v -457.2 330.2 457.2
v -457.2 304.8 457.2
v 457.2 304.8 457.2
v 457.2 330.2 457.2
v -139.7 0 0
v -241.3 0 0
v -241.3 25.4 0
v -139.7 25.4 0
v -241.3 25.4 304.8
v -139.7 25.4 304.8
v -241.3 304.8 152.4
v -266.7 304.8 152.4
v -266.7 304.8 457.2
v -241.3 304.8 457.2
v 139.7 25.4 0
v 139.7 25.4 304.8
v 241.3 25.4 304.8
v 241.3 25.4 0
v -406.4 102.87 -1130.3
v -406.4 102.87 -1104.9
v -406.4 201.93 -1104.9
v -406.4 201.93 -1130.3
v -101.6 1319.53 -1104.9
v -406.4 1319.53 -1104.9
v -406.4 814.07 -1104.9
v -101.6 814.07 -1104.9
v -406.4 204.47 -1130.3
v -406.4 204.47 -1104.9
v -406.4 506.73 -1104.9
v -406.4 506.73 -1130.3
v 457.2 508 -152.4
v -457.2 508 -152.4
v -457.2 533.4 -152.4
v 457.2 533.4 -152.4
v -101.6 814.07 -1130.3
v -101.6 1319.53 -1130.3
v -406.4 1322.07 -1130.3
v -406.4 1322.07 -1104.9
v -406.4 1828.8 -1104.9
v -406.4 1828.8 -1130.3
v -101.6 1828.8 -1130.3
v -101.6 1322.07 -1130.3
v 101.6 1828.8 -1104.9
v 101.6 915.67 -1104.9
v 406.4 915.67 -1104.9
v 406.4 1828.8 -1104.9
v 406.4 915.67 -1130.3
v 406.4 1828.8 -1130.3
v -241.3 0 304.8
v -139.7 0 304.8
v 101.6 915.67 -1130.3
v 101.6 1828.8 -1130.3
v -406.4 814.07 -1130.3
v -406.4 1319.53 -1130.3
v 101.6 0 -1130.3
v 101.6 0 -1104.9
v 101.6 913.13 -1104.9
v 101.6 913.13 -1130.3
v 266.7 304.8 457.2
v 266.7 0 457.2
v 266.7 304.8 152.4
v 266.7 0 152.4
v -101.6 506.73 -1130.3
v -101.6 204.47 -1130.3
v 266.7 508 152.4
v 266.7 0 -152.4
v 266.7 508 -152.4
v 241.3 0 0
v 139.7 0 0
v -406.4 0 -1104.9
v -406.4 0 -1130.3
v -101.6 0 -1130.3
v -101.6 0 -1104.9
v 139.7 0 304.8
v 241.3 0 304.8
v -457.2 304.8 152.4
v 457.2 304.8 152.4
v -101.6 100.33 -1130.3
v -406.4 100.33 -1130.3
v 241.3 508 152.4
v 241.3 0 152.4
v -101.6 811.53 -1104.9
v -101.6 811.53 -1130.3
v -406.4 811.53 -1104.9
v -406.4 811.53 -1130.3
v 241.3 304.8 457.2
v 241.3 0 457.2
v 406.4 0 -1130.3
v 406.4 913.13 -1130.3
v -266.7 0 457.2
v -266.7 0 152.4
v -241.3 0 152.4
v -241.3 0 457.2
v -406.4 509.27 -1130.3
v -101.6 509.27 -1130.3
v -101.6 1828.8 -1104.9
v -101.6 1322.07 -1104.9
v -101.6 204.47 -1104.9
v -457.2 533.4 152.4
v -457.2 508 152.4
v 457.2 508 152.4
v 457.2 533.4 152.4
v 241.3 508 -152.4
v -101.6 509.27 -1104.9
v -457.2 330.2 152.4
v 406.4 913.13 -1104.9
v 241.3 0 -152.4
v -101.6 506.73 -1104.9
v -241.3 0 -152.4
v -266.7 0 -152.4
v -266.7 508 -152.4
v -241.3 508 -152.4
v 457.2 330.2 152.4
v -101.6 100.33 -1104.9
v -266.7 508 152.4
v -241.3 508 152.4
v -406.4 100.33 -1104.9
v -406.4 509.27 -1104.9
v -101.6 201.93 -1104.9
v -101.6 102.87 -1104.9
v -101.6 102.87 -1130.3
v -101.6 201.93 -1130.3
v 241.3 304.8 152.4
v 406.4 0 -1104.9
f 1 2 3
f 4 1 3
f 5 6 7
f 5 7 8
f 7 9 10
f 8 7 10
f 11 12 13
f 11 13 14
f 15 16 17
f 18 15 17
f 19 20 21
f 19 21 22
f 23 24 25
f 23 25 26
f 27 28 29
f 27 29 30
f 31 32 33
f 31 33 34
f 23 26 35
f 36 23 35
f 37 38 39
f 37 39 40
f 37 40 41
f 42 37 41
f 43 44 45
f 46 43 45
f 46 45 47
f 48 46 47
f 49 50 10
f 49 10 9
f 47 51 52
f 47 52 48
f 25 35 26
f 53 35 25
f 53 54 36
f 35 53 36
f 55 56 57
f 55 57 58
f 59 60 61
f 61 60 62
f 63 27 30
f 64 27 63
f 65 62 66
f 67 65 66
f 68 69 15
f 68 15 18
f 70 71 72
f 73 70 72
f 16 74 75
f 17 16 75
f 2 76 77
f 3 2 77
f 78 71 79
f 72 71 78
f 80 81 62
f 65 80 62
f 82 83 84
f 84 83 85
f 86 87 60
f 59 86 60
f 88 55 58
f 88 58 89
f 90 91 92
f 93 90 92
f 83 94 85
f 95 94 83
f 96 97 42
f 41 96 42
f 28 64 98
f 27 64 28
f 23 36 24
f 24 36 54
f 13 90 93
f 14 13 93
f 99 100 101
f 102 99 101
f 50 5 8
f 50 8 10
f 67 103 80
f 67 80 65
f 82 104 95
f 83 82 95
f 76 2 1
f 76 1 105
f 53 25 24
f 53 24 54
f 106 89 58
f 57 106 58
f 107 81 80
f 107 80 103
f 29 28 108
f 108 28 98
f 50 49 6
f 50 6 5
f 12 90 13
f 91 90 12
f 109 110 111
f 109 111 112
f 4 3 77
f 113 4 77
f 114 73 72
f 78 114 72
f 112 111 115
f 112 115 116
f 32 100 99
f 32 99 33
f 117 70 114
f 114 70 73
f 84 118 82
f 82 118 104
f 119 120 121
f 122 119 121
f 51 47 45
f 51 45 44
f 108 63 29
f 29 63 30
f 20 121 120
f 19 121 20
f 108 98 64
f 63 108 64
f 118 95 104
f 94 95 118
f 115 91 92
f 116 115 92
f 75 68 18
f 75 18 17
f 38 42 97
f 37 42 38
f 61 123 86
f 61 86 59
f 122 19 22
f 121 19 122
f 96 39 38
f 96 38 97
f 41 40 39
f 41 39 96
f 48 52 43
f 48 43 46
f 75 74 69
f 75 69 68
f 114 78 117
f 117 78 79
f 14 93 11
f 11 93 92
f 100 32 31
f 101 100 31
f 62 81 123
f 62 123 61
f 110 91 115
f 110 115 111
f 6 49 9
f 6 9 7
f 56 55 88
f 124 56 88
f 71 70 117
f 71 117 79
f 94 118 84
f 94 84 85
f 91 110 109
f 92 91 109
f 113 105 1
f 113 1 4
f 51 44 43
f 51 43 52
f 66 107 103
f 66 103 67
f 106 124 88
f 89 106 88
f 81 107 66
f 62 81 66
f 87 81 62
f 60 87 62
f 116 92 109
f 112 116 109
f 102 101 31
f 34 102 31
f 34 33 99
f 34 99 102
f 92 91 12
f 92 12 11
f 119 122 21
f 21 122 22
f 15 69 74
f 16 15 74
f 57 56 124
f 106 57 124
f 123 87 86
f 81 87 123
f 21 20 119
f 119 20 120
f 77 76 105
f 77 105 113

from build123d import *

# Parameters (mm, degrees)
SKETCH1_W               = 25.4
SKETCH1_H               = 304.8
BOSS_EXTRUDE1_DEPTH     = 508
BOSS_EXTRUDE1_2_DEPTH   = 508
SKETCH2_W               = 914.4
SKETCH2_H               = 304.8
BOSS_EXTRUDE2_DEPTH     = 25.4
SKETCH3_W               = 25.4
SKETCH3_H               = 304.8
BOSS_EXTRUDE3_DEPTH     = 304.8
BOSS_EXTRUDE3_2_DEPTH   = 304.8
SKETCH4_W               = 914.4
SKETCH4_H               = 304.8
BOSS_EXTRUDE4_DEPTH     = 25.4
SKETCH5_W               = 304.8
SKETCH5_H               = 25.4
BOSS_EXTRUDE5_DEPTH     = 1828.8
BOSS_EXTRUDE5_2_DEPTH   = 1828.8
BOSS_EXTRUDE6_DEPTH     = 25.4
SKETCH7_W               = 101.6
SKETCH7_H               = 304.8
BOSS_EXTRUDE6_2_DEPTH   = 25.4
SKETCH6_W               = 304.8
SKETCH6_H               = 2.54
CUT_EXTRUDE_THIN1_DEPTH = 25.4


with BuildPart() as part:
    # Sketch1 → Boss-Extrude1 (new body)
    with BuildSketch(Plane(origin=(0, 0, 0), x_dir=(1, 0, 0), z_dir=(0, 1, 0))):
        with Locations((-254, 0)):
            Rectangle(SKETCH1_W, SKETCH1_H)
    extrude(amount=BOSS_EXTRUDE1_DEPTH)


with BuildPart() as body_2:
    # Sketch1 → Boss-Extrude1 2 (new body)
    with BuildSketch(Plane(origin=(0, 0, 0), x_dir=(1, 0, 0), z_dir=(0, 1, 0))):
        with Locations((254, 0)):
            Rectangle(SKETCH1_W, SKETCH1_H)
    extrude(amount=BOSS_EXTRUDE1_2_DEPTH)


with BuildPart() as body_3:
    # Sketch2 → Boss-Extrude2 (new body)
    with BuildSketch(Plane(origin=(0, 508, 0), x_dir=(1, 0, 0), z_dir=(0, 1, 0))):
        Rectangle(SKETCH2_W, SKETCH2_H)
    extrude(amount=BOSS_EXTRUDE2_DEPTH)


with BuildPart() as body_4:
    # Sketch3 → Boss-Extrude3 (new body)
    with BuildSketch(Plane(origin=(0, 0, 0), x_dir=(1, 0, 0), z_dir=(0, 1, 0))):
        with Locations((-254, -304.8)):
            Rectangle(SKETCH3_W, SKETCH3_H)
    extrude(amount=BOSS_EXTRUDE3_DEPTH)


with BuildPart() as body_5:
    # Sketch3 → Boss-Extrude3 2 (new body)
    with BuildSketch(Plane(origin=(0, 0, 0), x_dir=(1, 0, 0), z_dir=(0, 1, 0))):
        with Locations((254, -304.8)):
            Rectangle(SKETCH3_W, SKETCH3_H)
    extrude(amount=BOSS_EXTRUDE3_2_DEPTH)


with BuildPart() as body_6:
    # Sketch4 → Boss-Extrude4 (new body)
    with BuildSketch(Plane(origin=(0, 304.8, 0), x_dir=(1, 0, 0), z_dir=(0, 1, 0))):
        with Locations((0, -304.8)):
            Rectangle(SKETCH4_W, SKETCH4_H)
    extrude(amount=BOSS_EXTRUDE4_DEPTH)


with BuildPart() as body_7:
    # Sketch5 → Boss-Extrude5 (new body)
    with BuildSketch(Plane(origin=(0, 0, 0), x_dir=(1, 0, 0), z_dir=(0, 1, 0))):
        with Locations((-254, 1117.6)):
            Rectangle(SKETCH5_W, SKETCH5_H)
    extrude(amount=BOSS_EXTRUDE5_DEPTH)


with BuildPart() as body_8:
    # Sketch5 → Boss-Extrude5 2 (new body)
    with BuildSketch(Plane(origin=(0, 0, 0), x_dir=(1, 0, 0), z_dir=(0, 1, 0))):
        with Locations((254, 1117.6)):
            Rectangle(SKETCH5_W, SKETCH5_H)
    extrude(amount=BOSS_EXTRUDE5_2_DEPTH)


with BuildPart() as body_9:
    # Sketch7 → Boss-Extrude6 (new body)
    with BuildSketch(Plane.XZ):
        Polygon((-139.7, 304.8), (-241.3, 304.8), (-241.3, 152.4), (-241.3, 0), (-139.7, 0), align=None)
    extrude(amount=-BOSS_EXTRUDE6_DEPTH)


with BuildPart() as body_10:
    # Sketch7 → Boss-Extrude6 2 (new body)
    with BuildSketch(Plane.XZ):
        with Locations((190.5, 152.4)):
            Rectangle(SKETCH7_W, SKETCH7_H)
    extrude(amount=-BOSS_EXTRUDE6_2_DEPTH)


with BuildPart() as cut_extrude_thin1_tool:
    # Sketch6 → Cut-Extrude-Thin1 (new body)
    with BuildSketch(Plane(origin=(0, 0, -1130.3), x_dir=(-1, 0, 0), z_dir=(0, 0, -1))):
        with Locations((-254, 914.4)):
            Rectangle(SKETCH6_W, SKETCH6_H)
        with Locations((254, 1320.8)):
            Rectangle(SKETCH6_W, SKETCH6_H)
        with Locations((254, 812.8)):
            Rectangle(SKETCH6_W, SKETCH6_H)
        with Locations((254, 508)):
            Rectangle(SKETCH6_W, SKETCH6_H)
        with Locations((254, 203.2)):
            Rectangle(SKETCH6_W, SKETCH6_H)
        with Locations((254, 101.6)):
            Rectangle(SKETCH6_W, SKETCH6_H)
    extrude(amount=-CUT_EXTRUDE_THIN1_DEPTH)


with BuildPart() as body_7_1:
    add(body_7.part)

    # Cut-Extrude-Thin1: cut by cut_extrude_thin1_tool
    add(cut_extrude_thin1_tool.part, mode=Mode.SUBTRACT)


with BuildPart() as body_8_1:
    add(body_8.part)

    # Cut-Extrude-Thin1: cut by cut_extrude_thin1_tool
    add(cut_extrude_thin1_tool.part, mode=Mode.SUBTRACT)


with BuildPart() as cut_extrude_thin1_piece_1:
    # of the separate pieces the step leaves, piece 1, a body of its own (cut_extrude_thin1_pieces)
    add(body_7_1.part.solids().sort_by_distance((-406.4, 1322.07, -1130.3))[0])


with BuildPart() as cut_extrude_thin1_piece_2:
    # of the separate pieces the step leaves, piece 2, a body of its own (cut_extrude_thin1_pieces)
    add(body_7_1.part.solids().sort_by_distance((-406.4, 814.07, -1130.3))[0])


with BuildPart() as cut_extrude_thin1_piece_3:
    # of the separate pieces the step leaves, piece 3, a body of its own (cut_extrude_thin1_pieces)
    add(body_7_1.part.solids().sort_by_distance((-406.4, 204.47, -1130.3))[0])


with BuildPart() as cut_extrude_thin1_piece_4:
    # of the separate pieces the step leaves, piece 4, a body of its own (cut_extrude_thin1_pieces)
    add(body_7_1.part.solids().sort_by_distance((-406.4, 509.27, -1130.3))[0])


with BuildPart() as cut_extrude_thin1_piece_5:
    # of the separate pieces the step leaves, piece 5, a body of its own (cut_extrude_thin1_pieces)
    add(body_7_1.part.solids().sort_by_distance((-406.4, 0, -1130.3))[0])


with BuildPart() as cut_extrude_thin1_piece_6:
    # of the separate pieces the step leaves, piece 6, a body of its own (cut_extrude_thin1_pieces)
    add(body_7_1.part.solids().sort_by_distance((-406.4, 102.87, -1130.3))[0])


with BuildPart() as cut_extrude_thin1_piece_1_of_body_8:
    # of the separate pieces the step leaves, piece 1, a body of its own (cut_extrude_thin1_pieces_of_body_8)
    add(body_8_1.part.solids().sort_by_distance((101.6, 0, -1130.3))[0])


with BuildPart() as cut_extrude_thin1_piece_2_of_body_8:
    # of the separate pieces the step leaves, piece 2, a body of its own (cut_extrude_thin1_pieces_of_body_8)
    add(body_8_1.part.solids().sort_by_distance((101.6, 915.67, -1130.3))[0])


solid = Compound([part.part, body_2.part, body_3.part, body_4.part, body_5.part, body_6.part, body_9.part, body_10.part, cut_extrude_thin1_piece_1.part, cut_extrude_thin1_piece_2.part, cut_extrude_thin1_piece_3.part, cut_extrude_thin1_piece_4.part, cut_extrude_thin1_piece_5.part, cut_extrude_thin1_piece_6.part, cut_extrude_thin1_piece_1_of_body_8.part, cut_extrude_thin1_piece_2_of_body_8.part])
